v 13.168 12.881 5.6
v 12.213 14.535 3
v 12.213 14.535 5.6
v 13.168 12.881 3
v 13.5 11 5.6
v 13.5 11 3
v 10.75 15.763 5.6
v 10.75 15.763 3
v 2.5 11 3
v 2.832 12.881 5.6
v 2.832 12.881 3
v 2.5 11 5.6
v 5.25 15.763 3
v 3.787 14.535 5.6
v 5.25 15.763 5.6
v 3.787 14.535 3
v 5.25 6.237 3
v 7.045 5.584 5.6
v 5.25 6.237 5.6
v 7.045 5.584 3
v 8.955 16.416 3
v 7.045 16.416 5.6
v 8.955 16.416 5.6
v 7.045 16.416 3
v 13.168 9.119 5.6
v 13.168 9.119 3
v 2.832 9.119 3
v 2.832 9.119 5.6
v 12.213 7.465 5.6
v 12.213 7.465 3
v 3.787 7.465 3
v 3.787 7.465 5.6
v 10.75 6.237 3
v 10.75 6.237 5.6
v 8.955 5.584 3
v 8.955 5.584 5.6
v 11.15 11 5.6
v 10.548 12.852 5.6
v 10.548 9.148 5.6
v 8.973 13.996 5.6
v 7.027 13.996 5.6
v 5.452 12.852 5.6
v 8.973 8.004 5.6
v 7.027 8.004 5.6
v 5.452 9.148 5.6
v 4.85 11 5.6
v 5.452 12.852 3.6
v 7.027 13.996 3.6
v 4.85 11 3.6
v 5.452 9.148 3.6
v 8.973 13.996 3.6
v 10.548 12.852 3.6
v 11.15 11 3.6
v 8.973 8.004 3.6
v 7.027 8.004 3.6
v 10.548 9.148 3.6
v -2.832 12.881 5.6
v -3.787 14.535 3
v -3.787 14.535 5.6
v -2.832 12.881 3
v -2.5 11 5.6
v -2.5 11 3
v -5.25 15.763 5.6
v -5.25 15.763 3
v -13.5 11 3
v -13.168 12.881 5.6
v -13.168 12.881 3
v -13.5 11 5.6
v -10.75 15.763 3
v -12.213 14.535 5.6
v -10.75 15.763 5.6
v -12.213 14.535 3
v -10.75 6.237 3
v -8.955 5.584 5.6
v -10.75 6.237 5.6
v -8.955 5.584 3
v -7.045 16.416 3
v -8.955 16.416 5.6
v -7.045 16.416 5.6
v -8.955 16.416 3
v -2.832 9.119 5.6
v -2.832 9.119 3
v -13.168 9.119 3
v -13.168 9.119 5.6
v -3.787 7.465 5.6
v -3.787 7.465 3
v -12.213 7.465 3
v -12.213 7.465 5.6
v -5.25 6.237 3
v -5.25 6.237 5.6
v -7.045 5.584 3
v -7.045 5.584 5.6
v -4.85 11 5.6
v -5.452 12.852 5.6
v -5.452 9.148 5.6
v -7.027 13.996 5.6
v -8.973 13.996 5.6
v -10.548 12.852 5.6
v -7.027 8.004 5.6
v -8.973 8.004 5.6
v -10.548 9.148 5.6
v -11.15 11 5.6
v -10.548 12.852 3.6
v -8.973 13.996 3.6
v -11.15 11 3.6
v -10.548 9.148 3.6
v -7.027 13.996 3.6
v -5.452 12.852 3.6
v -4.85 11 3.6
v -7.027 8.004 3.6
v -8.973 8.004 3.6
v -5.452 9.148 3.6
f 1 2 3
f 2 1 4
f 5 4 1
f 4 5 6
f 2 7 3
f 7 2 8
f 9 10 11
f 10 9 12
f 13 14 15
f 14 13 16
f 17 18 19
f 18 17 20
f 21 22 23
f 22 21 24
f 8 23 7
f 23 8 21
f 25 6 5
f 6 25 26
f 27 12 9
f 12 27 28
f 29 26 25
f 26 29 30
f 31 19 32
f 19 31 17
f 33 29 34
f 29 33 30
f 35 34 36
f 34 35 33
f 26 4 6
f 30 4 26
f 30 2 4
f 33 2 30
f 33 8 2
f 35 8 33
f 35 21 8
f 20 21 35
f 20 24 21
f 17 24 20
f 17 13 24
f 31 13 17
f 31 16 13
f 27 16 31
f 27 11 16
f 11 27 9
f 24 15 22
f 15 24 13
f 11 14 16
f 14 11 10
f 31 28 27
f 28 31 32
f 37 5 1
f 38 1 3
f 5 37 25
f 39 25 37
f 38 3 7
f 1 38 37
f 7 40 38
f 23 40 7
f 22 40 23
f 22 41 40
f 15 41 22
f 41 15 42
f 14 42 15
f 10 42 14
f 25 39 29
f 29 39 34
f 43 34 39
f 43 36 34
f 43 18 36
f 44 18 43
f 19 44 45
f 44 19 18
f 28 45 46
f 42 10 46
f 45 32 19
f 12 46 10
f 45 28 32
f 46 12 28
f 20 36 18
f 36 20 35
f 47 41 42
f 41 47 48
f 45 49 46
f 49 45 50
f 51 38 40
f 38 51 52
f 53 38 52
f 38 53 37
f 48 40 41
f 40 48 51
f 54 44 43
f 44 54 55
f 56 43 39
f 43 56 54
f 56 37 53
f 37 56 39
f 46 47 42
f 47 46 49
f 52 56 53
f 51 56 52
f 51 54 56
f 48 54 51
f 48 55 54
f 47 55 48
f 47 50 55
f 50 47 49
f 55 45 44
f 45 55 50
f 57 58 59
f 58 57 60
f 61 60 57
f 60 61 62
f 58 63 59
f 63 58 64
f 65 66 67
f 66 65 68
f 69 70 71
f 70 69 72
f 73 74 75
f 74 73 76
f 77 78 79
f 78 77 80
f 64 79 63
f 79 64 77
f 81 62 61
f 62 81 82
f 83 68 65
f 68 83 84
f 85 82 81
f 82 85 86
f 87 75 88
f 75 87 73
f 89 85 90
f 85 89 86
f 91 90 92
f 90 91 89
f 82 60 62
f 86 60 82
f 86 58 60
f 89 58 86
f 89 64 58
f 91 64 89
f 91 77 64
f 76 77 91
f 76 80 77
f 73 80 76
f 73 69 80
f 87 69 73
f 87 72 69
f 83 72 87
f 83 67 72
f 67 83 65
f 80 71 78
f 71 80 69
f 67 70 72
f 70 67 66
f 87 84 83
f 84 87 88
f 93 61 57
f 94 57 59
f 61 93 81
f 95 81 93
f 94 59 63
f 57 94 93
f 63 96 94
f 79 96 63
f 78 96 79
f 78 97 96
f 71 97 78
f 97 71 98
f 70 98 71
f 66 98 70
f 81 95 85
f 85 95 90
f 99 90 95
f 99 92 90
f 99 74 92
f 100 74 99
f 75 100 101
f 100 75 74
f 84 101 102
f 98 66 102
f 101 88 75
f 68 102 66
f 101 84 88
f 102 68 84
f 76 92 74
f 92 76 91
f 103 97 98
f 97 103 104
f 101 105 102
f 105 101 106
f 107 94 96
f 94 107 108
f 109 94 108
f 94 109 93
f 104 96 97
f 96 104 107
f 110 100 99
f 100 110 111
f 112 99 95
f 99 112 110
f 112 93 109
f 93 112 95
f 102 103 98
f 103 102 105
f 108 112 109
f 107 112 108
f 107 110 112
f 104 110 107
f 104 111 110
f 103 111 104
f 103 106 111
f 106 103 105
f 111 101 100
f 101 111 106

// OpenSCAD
// latches/magnetic.scad — small puck on each band end holding a glued-in
// 6 mm × 2 mm neodymium disc magnet.
// MIT licensed.
//
// Convention: end="left" places a puck at origin extending +X into the band
// (centered at MAGNET_POCKET_INSET from x=0); end="right" places a puck
// extending -X from origin (centered at -MAGNET_POCKET_INSET). The caller
// translates the right invocation to band_length so it sits inside the band's
// right end.
//
// Print orientation: pocket opens UP (toward +Z) so the magnet drops in from
// above. The user glues with cyanoacrylate. Polarity is the user's
// responsibility — mark each magnet before gluing because you cannot reverse
// it once cured.

MAGNET_DIAMETER     = 6;     // mm
MAGNET_THICKNESS    = 2;     // mm
MAGNET_TOLERANCE    = 0.3;   // mm of slack so the magnet drops in cleanly
MAGNET_PUCK_R       = 5.5;   // mm — puck around the pocket
MAGNET_PUCK_HEIGHT  = 2.6;   // mm above the band
MAGNET_PUCK_INSET   = 8;     // mm — puck center from the band end

module _magnet_puck(band_thickness) {
    // puck sits ON TOP of the band at z = band_thickness, with a downward-
    // opening cylinder removed for the magnet (opening on the puck's TOP face
    // because the puck sits proud of the band — the pocket can open up
    // without breaching the band).
    difference() {
        translate([0, 0, band_thickness])
            cylinder(h = MAGNET_PUCK_HEIGHT, r = MAGNET_PUCK_R);
        // pocket opens at the top of the puck, sunk down to leave a thin floor
        floor_thickness = max(MAGNET_PUCK_HEIGHT - MAGNET_THICKNESS, 0.4);
        translate([0, 0, band_thickness + floor_thickness])
            cylinder(h = MAGNET_THICKNESS + 0.1,
                     d = MAGNET_DIAMETER + MAGNET_TOLERANCE);
    }
}

module latch_magnetic(band_width, band_thickness, end = "both") {
    if (end == "left" || end == "both") {
        translate([MAGNET_PUCK_INSET, band_width / 2, 0])
            _magnet_puck(band_thickness);
    }
    if (end == "right" || end == "both") {
        translate([-MAGNET_PUCK_INSET, band_width / 2, 0])
            _magnet_puck(band_thickness);
    }
}

latch_magnetic(22, 3);
